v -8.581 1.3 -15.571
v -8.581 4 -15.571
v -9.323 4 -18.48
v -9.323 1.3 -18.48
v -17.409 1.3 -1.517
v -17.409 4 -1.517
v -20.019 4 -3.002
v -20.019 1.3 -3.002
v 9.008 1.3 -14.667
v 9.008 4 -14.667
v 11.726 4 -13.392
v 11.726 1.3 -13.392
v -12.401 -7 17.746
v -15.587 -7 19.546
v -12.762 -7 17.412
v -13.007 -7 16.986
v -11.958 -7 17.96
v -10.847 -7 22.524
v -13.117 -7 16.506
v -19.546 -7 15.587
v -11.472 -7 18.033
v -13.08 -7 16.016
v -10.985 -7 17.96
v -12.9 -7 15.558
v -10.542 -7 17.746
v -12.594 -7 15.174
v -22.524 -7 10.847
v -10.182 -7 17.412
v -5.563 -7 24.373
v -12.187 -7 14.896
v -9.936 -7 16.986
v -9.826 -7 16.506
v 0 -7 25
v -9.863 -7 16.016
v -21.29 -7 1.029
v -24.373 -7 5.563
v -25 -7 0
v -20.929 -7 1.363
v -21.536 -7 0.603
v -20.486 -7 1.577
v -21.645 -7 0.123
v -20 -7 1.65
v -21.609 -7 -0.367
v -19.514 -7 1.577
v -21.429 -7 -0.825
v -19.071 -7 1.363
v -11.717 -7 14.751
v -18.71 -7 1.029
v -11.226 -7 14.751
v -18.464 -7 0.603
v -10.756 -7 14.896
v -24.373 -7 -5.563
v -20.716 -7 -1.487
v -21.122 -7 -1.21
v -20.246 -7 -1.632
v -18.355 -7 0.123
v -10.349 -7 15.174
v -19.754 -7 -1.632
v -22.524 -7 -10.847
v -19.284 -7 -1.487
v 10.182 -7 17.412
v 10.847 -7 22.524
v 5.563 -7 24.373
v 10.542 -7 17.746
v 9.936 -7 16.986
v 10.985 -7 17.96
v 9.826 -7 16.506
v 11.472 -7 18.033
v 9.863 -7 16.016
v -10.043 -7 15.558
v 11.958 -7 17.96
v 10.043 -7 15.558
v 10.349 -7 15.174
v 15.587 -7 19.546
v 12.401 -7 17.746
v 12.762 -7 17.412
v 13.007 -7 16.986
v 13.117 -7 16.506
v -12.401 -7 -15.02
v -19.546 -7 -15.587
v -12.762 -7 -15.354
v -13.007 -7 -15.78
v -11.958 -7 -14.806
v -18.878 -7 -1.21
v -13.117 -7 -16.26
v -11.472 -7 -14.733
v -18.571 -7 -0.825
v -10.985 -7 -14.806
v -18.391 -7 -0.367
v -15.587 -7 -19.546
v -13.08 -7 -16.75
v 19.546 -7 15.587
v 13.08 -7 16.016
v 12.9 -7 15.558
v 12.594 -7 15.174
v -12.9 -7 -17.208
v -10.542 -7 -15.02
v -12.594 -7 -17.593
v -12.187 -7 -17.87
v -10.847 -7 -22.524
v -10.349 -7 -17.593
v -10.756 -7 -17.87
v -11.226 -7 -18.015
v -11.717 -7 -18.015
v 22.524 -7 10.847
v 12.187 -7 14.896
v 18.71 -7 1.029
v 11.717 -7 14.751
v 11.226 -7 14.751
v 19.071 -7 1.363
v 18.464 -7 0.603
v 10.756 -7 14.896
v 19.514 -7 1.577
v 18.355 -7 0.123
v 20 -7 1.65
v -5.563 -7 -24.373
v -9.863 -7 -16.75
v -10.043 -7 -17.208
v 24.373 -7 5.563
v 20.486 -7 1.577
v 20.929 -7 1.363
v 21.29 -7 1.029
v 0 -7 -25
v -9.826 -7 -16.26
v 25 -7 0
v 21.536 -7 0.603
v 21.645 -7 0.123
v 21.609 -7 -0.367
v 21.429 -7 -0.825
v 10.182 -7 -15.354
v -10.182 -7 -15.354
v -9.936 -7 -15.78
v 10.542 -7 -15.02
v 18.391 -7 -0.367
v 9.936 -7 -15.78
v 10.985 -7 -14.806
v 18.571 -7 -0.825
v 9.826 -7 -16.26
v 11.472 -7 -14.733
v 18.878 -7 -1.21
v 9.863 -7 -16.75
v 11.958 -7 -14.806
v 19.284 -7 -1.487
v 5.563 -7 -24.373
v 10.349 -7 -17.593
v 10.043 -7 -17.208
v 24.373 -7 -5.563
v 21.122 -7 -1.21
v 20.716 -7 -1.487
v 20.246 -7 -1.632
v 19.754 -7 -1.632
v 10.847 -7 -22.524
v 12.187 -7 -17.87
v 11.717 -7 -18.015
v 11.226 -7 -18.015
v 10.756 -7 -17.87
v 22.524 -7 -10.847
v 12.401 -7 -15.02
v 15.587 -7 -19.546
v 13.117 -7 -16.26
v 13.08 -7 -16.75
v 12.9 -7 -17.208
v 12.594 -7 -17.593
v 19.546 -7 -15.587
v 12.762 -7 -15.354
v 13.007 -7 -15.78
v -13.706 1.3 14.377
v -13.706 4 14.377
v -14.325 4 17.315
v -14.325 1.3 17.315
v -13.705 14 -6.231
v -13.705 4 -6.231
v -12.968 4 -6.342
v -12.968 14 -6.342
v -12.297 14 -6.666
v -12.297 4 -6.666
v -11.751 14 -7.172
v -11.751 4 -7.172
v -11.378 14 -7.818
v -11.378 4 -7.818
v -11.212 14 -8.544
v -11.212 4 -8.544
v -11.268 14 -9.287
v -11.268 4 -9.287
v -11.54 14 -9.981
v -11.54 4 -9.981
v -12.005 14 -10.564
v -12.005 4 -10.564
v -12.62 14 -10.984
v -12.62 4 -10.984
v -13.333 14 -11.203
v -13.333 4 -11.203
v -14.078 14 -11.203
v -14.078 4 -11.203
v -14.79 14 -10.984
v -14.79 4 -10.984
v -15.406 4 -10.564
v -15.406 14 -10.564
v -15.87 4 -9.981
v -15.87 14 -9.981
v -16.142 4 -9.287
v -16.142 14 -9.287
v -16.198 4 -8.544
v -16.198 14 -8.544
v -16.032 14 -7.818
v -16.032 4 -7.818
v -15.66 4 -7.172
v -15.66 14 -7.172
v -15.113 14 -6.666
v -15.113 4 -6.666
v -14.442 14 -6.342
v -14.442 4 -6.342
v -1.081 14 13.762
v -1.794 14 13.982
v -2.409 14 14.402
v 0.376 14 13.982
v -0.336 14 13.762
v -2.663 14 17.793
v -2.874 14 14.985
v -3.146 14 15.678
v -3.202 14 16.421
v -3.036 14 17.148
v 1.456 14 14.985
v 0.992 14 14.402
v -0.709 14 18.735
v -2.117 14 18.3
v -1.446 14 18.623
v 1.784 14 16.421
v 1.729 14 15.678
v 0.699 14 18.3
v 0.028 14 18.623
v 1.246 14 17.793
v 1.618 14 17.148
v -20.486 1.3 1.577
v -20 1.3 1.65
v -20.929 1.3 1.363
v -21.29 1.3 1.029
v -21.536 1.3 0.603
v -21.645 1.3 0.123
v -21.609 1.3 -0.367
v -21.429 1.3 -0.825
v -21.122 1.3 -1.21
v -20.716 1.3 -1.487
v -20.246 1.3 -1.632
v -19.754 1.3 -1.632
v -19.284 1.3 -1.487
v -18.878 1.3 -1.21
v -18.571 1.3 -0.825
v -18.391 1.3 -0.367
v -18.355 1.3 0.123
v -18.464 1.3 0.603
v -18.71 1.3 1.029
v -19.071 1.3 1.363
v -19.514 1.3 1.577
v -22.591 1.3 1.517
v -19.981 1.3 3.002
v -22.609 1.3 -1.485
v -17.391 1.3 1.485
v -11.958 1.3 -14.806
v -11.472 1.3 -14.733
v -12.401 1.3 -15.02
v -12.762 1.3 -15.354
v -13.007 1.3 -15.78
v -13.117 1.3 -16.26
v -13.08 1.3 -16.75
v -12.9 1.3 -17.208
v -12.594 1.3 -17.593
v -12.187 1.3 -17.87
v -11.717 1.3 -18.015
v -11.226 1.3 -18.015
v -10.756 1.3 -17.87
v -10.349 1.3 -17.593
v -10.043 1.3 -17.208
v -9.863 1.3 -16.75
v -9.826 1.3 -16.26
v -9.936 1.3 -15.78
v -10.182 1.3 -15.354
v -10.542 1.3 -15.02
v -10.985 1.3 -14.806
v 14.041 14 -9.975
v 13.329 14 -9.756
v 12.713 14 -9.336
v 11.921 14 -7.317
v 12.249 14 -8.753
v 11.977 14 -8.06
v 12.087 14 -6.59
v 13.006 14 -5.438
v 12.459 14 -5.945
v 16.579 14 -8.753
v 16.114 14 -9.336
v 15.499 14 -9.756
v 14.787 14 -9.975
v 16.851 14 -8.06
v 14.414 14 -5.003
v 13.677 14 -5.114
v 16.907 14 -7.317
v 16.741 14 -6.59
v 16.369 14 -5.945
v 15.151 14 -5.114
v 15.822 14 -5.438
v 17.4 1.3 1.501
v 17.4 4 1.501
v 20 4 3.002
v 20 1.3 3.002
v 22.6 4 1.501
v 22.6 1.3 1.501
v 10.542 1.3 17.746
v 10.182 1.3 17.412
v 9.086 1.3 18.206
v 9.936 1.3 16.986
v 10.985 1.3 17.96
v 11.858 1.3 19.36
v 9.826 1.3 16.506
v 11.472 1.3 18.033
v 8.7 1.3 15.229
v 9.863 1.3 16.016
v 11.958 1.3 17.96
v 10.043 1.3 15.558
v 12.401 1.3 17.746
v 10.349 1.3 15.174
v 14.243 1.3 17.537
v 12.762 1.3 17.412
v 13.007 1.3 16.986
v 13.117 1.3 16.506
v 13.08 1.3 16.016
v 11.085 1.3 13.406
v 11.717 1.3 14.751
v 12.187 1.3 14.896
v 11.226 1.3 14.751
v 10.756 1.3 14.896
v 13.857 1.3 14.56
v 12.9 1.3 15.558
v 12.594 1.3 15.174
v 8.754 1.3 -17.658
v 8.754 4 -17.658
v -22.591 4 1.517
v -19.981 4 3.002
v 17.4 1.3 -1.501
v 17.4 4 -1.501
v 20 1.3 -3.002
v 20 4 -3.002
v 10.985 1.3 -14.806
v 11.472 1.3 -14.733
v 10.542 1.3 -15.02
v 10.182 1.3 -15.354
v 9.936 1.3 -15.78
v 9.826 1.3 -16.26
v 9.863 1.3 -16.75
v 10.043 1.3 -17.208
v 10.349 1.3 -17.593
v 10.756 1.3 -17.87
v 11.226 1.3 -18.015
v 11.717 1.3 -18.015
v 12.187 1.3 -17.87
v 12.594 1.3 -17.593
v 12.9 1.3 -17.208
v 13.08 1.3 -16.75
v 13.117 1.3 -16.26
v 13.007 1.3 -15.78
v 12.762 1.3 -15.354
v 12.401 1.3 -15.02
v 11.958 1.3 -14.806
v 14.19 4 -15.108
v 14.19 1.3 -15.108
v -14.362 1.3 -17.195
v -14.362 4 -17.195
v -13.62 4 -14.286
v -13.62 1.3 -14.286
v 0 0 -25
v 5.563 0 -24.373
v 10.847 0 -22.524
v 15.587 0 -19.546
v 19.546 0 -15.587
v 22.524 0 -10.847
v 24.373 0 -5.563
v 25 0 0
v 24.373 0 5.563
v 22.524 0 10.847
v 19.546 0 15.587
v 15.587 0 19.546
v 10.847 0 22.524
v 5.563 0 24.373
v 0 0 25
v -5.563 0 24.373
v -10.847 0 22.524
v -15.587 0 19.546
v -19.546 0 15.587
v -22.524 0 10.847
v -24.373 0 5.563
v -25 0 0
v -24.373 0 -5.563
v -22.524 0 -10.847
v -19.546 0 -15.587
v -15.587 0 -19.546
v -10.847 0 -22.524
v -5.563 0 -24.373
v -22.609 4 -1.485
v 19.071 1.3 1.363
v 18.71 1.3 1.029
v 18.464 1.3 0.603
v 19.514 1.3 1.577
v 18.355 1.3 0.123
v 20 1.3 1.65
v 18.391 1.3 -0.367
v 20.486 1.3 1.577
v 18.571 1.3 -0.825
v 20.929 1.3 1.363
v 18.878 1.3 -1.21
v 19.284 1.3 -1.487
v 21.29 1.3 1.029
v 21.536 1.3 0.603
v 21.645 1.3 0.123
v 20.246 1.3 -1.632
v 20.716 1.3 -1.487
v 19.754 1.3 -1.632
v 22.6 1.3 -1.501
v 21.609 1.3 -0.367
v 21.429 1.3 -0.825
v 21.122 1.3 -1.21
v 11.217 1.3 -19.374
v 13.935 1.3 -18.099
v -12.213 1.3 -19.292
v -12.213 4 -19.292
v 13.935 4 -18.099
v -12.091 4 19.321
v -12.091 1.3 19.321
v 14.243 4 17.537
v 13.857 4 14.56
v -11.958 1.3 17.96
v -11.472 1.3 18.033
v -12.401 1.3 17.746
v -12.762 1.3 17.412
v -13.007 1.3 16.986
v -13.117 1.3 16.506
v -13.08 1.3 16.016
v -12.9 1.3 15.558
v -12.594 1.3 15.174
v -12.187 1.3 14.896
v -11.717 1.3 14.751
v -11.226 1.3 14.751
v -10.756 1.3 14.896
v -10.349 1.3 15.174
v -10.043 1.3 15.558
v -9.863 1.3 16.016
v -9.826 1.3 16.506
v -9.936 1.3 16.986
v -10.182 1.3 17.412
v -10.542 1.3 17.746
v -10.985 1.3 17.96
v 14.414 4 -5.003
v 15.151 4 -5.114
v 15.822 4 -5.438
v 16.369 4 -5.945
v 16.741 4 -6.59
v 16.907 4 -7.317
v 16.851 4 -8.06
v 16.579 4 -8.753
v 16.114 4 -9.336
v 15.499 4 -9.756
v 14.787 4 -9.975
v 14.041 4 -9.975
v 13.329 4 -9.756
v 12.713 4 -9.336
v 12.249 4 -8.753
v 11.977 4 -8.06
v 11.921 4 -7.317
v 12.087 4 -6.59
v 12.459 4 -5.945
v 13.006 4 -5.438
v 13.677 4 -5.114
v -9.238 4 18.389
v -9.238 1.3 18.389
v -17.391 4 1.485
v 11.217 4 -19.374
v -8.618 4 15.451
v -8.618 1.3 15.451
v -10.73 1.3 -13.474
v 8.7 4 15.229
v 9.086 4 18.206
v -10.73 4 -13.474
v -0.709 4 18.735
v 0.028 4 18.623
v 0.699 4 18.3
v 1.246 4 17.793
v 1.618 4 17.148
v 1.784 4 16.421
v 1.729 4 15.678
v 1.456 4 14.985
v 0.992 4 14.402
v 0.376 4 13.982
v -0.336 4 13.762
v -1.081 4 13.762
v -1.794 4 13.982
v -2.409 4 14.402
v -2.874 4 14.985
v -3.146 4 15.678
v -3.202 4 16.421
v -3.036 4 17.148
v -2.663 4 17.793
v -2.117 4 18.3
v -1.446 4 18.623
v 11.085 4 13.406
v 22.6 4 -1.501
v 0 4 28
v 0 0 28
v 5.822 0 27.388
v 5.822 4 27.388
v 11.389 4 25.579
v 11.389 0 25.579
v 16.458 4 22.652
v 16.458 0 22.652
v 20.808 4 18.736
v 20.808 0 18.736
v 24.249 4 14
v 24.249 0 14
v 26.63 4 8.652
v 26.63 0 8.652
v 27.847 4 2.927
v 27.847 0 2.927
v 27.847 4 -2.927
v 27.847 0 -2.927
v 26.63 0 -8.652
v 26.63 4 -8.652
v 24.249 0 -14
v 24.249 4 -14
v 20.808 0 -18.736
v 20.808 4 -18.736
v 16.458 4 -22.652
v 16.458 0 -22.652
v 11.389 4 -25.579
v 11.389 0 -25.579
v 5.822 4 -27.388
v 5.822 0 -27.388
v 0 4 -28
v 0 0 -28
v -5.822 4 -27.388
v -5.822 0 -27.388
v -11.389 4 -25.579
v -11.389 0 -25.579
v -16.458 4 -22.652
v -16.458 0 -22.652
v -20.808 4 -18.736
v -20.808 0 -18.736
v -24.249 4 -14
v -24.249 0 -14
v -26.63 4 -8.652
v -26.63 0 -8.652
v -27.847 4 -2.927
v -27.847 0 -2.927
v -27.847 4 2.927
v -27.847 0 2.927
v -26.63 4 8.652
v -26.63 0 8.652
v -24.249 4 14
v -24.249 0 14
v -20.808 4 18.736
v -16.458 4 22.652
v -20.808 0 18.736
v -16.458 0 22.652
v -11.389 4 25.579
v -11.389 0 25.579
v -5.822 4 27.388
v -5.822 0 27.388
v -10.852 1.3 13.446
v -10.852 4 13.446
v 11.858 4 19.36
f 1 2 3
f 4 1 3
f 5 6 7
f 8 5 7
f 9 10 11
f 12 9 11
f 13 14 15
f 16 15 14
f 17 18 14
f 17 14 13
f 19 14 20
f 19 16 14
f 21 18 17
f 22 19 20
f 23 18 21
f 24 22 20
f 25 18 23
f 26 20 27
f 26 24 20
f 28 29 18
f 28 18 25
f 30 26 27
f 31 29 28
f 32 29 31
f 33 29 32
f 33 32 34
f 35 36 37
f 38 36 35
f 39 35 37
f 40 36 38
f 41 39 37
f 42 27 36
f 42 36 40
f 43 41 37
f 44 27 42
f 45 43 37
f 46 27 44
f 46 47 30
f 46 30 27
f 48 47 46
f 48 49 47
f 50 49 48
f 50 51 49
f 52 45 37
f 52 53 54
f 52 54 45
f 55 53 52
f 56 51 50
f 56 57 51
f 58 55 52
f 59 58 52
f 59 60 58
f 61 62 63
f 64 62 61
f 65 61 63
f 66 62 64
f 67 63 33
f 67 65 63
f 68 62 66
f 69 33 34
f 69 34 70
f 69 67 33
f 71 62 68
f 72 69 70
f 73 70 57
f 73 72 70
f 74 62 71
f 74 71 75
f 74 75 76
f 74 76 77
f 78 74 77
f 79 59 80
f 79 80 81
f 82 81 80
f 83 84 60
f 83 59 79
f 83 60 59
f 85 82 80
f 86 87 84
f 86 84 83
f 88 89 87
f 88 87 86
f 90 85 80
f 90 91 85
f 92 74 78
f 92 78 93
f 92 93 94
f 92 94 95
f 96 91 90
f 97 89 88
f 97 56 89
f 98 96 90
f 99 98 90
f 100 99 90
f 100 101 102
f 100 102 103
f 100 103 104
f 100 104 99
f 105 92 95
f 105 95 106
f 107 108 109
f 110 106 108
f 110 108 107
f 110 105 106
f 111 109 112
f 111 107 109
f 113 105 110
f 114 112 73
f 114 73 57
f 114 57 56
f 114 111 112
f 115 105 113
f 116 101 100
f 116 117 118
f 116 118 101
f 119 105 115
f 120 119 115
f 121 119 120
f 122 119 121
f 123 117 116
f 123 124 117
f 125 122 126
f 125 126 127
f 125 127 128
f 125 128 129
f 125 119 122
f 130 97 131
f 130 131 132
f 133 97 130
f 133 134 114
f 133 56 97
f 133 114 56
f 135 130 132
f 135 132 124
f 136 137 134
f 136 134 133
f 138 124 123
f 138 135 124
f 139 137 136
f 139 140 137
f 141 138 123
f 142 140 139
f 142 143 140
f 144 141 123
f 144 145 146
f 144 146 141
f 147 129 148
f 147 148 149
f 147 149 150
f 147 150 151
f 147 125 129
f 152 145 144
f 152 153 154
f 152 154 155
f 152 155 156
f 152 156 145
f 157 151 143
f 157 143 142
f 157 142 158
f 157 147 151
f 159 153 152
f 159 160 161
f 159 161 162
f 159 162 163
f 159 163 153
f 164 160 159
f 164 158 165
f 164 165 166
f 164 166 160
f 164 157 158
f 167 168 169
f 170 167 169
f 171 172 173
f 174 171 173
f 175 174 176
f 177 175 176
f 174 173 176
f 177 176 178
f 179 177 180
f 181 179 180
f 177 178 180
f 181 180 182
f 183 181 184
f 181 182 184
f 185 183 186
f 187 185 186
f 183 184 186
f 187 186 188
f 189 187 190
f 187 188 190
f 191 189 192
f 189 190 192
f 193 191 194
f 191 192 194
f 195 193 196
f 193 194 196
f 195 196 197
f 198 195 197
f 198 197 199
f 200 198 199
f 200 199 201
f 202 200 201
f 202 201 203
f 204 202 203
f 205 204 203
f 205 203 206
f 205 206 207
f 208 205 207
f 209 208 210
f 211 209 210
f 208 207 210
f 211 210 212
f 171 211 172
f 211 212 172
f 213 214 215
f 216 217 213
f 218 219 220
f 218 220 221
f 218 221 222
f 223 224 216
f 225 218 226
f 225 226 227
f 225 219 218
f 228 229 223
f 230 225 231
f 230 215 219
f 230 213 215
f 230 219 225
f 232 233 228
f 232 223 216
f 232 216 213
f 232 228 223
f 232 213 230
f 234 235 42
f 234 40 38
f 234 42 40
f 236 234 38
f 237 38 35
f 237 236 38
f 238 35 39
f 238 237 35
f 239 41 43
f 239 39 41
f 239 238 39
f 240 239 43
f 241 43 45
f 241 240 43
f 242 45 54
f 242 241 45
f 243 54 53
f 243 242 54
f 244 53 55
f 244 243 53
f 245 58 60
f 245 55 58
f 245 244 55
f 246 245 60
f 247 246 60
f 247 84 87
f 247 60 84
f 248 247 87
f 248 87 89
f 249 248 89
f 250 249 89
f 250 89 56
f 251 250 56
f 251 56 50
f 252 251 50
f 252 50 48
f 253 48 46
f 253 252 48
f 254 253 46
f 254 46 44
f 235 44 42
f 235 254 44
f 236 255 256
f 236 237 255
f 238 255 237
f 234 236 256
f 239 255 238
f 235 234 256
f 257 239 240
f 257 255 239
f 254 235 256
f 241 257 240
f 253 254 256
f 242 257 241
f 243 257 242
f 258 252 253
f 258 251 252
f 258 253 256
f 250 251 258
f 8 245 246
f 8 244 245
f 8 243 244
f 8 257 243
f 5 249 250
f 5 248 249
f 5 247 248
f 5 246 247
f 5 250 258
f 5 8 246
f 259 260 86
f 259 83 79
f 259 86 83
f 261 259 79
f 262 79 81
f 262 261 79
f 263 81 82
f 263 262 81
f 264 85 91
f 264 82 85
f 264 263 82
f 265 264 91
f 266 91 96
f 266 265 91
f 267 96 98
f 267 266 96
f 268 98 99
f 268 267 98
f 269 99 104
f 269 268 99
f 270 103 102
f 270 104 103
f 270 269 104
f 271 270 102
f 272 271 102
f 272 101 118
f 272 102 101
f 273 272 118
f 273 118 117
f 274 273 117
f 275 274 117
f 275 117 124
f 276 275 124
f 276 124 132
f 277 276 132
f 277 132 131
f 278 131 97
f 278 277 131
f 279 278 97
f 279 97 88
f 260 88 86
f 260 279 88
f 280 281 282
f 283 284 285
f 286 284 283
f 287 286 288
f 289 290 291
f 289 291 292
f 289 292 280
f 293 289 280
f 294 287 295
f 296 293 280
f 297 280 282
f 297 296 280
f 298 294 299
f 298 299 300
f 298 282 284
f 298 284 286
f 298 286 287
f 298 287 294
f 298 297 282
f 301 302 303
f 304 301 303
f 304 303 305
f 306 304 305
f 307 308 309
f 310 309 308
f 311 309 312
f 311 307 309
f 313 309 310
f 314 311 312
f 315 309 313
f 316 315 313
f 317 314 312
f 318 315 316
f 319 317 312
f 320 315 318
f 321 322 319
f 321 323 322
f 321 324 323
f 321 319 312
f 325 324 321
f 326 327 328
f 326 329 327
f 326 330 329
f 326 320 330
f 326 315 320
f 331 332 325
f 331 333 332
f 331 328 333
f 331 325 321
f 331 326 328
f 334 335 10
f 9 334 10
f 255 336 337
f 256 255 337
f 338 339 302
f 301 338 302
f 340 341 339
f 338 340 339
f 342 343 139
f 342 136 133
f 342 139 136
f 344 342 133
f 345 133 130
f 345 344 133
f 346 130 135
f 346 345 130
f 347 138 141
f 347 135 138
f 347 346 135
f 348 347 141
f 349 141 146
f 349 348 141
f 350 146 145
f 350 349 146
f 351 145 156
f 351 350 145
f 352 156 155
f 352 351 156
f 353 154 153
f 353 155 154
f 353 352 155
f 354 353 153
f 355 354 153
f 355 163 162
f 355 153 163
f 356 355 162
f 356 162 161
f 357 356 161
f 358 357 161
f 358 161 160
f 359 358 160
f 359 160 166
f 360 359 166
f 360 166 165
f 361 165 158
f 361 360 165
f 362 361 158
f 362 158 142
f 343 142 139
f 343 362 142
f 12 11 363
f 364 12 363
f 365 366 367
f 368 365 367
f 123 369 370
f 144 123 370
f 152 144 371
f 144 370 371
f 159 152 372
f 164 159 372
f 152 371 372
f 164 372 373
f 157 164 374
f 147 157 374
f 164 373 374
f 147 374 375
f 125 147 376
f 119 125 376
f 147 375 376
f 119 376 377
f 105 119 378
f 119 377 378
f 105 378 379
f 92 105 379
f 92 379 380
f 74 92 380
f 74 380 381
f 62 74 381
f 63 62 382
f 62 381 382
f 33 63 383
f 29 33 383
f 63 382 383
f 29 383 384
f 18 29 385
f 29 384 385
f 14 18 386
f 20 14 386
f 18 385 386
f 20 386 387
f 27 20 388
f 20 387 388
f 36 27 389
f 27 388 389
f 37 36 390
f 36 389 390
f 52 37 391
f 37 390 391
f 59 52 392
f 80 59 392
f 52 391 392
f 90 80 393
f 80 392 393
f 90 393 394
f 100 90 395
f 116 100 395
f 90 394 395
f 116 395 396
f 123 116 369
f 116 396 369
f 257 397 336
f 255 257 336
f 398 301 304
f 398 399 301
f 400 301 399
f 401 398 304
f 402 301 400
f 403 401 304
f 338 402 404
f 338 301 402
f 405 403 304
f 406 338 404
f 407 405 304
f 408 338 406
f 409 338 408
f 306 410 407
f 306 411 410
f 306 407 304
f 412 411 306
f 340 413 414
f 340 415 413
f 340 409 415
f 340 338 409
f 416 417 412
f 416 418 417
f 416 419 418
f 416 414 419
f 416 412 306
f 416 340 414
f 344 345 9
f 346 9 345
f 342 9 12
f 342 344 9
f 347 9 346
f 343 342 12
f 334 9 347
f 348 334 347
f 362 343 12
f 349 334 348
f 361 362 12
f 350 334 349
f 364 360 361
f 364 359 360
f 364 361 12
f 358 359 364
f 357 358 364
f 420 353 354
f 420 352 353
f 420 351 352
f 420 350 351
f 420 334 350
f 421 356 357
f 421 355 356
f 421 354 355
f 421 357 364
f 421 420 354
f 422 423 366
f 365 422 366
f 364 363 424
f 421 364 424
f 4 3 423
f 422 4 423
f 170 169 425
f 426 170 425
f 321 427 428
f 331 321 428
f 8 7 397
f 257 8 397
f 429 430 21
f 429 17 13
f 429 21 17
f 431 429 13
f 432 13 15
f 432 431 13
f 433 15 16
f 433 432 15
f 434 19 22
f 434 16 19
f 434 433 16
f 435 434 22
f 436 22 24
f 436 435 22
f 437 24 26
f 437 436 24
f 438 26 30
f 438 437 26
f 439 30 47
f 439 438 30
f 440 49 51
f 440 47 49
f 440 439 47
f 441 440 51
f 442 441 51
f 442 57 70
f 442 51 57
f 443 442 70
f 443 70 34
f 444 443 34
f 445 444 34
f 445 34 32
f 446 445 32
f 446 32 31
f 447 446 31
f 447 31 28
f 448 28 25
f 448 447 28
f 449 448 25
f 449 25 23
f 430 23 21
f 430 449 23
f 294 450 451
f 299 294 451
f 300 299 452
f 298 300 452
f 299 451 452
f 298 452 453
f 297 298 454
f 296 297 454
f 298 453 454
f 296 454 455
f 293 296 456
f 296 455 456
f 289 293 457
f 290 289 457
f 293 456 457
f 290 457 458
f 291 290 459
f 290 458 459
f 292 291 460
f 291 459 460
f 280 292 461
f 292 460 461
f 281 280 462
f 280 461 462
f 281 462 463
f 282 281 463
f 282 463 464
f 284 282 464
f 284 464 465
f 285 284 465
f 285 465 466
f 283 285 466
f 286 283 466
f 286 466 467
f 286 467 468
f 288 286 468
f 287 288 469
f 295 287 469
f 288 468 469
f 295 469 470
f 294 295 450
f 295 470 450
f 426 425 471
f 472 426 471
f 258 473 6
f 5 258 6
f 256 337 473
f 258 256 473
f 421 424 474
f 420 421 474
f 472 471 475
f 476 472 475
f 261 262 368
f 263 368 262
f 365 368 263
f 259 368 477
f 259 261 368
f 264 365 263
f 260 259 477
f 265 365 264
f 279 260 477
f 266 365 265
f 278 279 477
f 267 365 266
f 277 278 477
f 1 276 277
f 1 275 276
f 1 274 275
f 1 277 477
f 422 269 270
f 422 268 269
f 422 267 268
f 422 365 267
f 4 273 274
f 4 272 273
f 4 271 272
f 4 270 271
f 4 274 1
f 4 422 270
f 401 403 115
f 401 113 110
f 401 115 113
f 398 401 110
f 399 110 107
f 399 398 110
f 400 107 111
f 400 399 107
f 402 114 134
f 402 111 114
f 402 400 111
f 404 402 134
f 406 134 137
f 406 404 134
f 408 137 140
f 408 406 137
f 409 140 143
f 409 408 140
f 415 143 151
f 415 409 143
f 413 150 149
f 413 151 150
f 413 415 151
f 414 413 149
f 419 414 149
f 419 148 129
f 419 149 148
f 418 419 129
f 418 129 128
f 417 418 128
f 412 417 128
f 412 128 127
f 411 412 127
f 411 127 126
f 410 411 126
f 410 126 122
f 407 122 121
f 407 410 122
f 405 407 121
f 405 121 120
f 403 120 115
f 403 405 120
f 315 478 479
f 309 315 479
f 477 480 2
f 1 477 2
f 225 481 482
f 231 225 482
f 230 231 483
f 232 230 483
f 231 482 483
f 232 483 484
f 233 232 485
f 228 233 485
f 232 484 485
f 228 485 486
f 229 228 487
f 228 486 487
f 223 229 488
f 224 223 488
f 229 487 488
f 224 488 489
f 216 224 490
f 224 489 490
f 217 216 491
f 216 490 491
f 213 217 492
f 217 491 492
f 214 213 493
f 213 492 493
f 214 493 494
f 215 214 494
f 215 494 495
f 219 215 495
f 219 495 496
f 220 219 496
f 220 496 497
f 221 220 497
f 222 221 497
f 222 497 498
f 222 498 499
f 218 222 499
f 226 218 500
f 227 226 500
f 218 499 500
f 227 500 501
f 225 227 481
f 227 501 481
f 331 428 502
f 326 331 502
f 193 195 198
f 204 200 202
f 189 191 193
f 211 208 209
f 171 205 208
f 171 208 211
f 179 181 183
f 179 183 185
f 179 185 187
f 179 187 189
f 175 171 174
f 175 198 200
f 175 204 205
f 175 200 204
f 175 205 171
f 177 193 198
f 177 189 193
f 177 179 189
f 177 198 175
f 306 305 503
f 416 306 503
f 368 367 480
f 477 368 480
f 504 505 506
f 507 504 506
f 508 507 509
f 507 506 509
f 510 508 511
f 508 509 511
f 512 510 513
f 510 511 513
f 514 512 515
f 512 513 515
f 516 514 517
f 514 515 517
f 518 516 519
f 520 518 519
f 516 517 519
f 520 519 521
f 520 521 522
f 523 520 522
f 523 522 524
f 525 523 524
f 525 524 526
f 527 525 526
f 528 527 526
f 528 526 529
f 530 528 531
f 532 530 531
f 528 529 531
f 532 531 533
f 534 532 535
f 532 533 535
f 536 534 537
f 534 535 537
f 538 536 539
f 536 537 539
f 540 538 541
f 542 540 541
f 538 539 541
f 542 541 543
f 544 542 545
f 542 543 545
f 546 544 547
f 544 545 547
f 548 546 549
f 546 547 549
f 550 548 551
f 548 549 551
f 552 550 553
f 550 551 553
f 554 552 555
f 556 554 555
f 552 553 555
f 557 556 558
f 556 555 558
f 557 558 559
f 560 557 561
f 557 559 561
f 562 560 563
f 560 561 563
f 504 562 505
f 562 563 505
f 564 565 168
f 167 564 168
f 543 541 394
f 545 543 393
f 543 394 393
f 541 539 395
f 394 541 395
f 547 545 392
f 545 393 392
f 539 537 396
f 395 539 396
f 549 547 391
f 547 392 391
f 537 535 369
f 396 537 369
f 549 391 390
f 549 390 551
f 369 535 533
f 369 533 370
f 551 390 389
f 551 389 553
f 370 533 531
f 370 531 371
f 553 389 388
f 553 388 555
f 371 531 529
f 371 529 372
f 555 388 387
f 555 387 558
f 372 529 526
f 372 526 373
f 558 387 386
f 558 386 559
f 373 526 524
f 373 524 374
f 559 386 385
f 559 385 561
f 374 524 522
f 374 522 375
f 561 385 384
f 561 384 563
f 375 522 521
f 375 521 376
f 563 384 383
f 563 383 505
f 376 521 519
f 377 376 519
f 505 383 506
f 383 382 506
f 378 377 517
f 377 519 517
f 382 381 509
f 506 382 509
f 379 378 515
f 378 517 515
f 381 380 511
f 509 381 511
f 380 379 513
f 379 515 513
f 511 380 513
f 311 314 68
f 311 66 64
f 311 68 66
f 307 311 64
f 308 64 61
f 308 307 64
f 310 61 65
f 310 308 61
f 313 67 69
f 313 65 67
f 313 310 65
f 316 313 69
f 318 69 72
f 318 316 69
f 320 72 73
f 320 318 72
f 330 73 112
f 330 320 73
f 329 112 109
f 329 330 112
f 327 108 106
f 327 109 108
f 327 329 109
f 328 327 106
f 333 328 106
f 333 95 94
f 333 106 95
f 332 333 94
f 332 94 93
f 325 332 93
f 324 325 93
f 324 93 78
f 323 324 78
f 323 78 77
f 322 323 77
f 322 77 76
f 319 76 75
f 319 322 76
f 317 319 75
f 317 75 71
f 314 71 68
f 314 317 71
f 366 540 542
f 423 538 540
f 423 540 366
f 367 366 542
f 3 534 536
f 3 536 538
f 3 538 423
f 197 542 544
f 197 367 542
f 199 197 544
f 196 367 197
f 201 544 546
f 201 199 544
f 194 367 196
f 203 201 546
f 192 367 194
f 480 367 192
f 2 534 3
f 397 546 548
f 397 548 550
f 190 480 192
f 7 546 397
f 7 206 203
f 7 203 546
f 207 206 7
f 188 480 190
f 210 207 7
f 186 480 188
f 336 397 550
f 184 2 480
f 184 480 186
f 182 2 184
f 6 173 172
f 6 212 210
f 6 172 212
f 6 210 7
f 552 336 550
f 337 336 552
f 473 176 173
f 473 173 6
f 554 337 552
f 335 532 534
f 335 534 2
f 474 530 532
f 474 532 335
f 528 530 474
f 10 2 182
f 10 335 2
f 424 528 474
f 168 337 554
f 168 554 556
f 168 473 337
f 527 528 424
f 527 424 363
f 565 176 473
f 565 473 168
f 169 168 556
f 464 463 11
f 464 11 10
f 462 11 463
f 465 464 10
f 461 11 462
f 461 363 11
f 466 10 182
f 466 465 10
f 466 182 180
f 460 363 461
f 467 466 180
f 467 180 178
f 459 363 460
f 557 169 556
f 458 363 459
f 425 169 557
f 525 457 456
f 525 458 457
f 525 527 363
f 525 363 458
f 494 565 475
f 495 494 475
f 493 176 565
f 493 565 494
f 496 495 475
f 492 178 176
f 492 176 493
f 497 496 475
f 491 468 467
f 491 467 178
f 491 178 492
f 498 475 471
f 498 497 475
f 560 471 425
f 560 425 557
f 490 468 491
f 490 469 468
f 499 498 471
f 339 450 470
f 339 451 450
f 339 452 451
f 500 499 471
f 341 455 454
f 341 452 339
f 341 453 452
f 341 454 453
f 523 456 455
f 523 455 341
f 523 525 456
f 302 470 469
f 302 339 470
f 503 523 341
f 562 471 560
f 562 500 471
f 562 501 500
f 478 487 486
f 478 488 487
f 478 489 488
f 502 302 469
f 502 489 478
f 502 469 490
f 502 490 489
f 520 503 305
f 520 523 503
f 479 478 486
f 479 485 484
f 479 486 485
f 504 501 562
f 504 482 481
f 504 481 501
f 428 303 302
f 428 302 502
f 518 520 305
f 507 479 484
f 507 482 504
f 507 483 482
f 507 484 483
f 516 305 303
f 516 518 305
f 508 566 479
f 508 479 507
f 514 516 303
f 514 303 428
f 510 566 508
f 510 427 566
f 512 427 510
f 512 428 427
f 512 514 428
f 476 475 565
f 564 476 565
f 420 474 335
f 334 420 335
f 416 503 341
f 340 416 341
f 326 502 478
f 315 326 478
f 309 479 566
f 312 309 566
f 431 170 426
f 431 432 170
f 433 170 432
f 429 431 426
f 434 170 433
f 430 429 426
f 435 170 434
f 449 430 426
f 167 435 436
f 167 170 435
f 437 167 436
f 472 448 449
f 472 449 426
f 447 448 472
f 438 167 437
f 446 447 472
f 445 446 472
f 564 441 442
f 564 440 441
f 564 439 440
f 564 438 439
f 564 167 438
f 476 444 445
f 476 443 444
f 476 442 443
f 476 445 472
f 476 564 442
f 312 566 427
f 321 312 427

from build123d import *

# Parameters (mm, degrees)
SKETCH3_R               = 28
BOSS_EXTRUDE1_DEPTH     = 4
SKETCH6_R               = 25
BOSS_EXTRUDE4_DEPTH     = 7
SKETCH7_R               = 2.5
BOSS_EXTRUDE5_DEPTH     = 10
CUT_EXTRUDE1_DEPTH      = 10
CUT_EXTRUDE1_DEPTH_BACK = 43
SKETCH8_R               = 1.65
CUT_EXTRUDE3_DEPTH      = 2.7


with BuildPart() as part:
    # Sketch3 → Boss-Extrude1 (new body)
    with BuildSketch(Plane(origin=(0, 0, 0), x_dir=(1, 0, 0), z_dir=(0, 1, 0))):
        with Locations(Location((0, 0, 0), (0, 0, 270))):
            Circle(SKETCH3_R)
    extrude(amount=BOSS_EXTRUDE1_DEPTH)

    # Sketch6 → Boss-Extrude4 (add)
    with BuildSketch(Plane.XZ):
        with Locations(Location((0, 0, 0), (0, 0, 270))):
            Circle(SKETCH6_R)
    extrude(amount=BOSS_EXTRUDE4_DEPTH)

    # Sketch7 → Boss-Extrude5 (add)
    with BuildSketch(Plane(origin=(0, 4, 0), x_dir=(1, 0, 0), z_dir=(0, 1, 0))):
        with Locations(Location((14.413926039, 7.503414965, 0), (0, 0, 270))):
            Circle(SKETCH7_R)
        with Locations(Location((-13.705110994, 8.731118636, 0), (0, 0, 270))):
            Circle(SKETCH7_R)
        with Locations(Location((-0.708815045, -16.234533601, 0), (0, 0, 270))):
            Circle(SKETCH7_R)
    extrude(amount=BOSS_EXTRUDE5_DEPTH)

    # Sketch8 → Cut-Extrude1 (cut, two sides: drawn at the far end of the back side and taken through both)
    with BuildSketch(Plane.XZ.offset(-CUT_EXTRUDE1_DEPTH_BACK)):
        with Locations(Location((20, 0, 0), (0, 0, 90))):
            Circle(SKETCH8_R)
        with Locations(Location((-20, 0, 0), (0, 0, 90))):
            Circle(SKETCH8_R)
        with Locations(Location((11.471528727, 16.383040886, 0), (0, 0, 90))):
            Circle(SKETCH8_R)
        with Locations(Location((-11.471528727, -16.383040886, 0), (0, 0, 90))):
            Circle(SKETCH8_R)
        with Locations(Location((11.471528727, -16.383040886, 0), (0, 0, 90))):
            Circle(SKETCH8_R)
        with Locations(Location((-11.471528727, 16.383040886, 0), (0, 0, 90))):
            Circle(SKETCH8_R)
    extrude(amount=CUT_EXTRUDE1_DEPTH + CUT_EXTRUDE1_DEPTH_BACK, mode=Mode.SUBTRACT)

    # Sketch11 → Cut-Extrude3 (cut)
    with BuildSketch(Plane(origin=(0, 4, 0), x_dir=(1, 0, 0), z_dir=(0, 1, 0))):
        Polygon((11.858091258, -19.360271603), (14.243167426, -17.536883273), (13.856604896, -14.559652555), (11.084966196, -13.405810169), (8.699890028, -15.229198499), (9.086452558, -18.206429216), align=None)
        Polygon((-12.091418901, -19.320568674), (-9.237500125, -18.388645418), (-8.617609951, -15.45111763), (-10.851638553, -13.445513098), (-13.705557329, -14.377436353), (-14.325447503, -17.314964141), align=None)
        Polygon((-22.590586111, -1.517299224), (-19.981273382, -3.002162995), (-17.390687271, -1.48486377), (-17.409413889, 1.517299224), (-20.018726618, 3.002162995), (-22.609312729, 1.48486377), align=None)
        Polygon((20, -3.0022214), (22.6, -1.5011107), (22.6, 1.5011107), (20, 3.0022214), (17.4, 1.5011107), (17.4, -1.5011107), align=None)
        Polygon((9.008253879, 14.666762832), (11.726231698, 13.391643264), (14.189506546, 15.107921318), (13.934803575, 18.09931894), (11.216825756, 19.374438507), (8.753550908, 17.658160453), align=None)
        Polygon((-10.729703857, 13.473912288), (-8.581237024, 15.57091577), (-9.323061894, 18.480044367), (-12.213353597, 19.292169483), (-14.36182043, 17.195166002), (-13.61999556, 14.286037405), align=None)
    extrude(amount=-CUT_EXTRUDE3_DEPTH, mode=Mode.SUBTRACT)


solid = part.part
